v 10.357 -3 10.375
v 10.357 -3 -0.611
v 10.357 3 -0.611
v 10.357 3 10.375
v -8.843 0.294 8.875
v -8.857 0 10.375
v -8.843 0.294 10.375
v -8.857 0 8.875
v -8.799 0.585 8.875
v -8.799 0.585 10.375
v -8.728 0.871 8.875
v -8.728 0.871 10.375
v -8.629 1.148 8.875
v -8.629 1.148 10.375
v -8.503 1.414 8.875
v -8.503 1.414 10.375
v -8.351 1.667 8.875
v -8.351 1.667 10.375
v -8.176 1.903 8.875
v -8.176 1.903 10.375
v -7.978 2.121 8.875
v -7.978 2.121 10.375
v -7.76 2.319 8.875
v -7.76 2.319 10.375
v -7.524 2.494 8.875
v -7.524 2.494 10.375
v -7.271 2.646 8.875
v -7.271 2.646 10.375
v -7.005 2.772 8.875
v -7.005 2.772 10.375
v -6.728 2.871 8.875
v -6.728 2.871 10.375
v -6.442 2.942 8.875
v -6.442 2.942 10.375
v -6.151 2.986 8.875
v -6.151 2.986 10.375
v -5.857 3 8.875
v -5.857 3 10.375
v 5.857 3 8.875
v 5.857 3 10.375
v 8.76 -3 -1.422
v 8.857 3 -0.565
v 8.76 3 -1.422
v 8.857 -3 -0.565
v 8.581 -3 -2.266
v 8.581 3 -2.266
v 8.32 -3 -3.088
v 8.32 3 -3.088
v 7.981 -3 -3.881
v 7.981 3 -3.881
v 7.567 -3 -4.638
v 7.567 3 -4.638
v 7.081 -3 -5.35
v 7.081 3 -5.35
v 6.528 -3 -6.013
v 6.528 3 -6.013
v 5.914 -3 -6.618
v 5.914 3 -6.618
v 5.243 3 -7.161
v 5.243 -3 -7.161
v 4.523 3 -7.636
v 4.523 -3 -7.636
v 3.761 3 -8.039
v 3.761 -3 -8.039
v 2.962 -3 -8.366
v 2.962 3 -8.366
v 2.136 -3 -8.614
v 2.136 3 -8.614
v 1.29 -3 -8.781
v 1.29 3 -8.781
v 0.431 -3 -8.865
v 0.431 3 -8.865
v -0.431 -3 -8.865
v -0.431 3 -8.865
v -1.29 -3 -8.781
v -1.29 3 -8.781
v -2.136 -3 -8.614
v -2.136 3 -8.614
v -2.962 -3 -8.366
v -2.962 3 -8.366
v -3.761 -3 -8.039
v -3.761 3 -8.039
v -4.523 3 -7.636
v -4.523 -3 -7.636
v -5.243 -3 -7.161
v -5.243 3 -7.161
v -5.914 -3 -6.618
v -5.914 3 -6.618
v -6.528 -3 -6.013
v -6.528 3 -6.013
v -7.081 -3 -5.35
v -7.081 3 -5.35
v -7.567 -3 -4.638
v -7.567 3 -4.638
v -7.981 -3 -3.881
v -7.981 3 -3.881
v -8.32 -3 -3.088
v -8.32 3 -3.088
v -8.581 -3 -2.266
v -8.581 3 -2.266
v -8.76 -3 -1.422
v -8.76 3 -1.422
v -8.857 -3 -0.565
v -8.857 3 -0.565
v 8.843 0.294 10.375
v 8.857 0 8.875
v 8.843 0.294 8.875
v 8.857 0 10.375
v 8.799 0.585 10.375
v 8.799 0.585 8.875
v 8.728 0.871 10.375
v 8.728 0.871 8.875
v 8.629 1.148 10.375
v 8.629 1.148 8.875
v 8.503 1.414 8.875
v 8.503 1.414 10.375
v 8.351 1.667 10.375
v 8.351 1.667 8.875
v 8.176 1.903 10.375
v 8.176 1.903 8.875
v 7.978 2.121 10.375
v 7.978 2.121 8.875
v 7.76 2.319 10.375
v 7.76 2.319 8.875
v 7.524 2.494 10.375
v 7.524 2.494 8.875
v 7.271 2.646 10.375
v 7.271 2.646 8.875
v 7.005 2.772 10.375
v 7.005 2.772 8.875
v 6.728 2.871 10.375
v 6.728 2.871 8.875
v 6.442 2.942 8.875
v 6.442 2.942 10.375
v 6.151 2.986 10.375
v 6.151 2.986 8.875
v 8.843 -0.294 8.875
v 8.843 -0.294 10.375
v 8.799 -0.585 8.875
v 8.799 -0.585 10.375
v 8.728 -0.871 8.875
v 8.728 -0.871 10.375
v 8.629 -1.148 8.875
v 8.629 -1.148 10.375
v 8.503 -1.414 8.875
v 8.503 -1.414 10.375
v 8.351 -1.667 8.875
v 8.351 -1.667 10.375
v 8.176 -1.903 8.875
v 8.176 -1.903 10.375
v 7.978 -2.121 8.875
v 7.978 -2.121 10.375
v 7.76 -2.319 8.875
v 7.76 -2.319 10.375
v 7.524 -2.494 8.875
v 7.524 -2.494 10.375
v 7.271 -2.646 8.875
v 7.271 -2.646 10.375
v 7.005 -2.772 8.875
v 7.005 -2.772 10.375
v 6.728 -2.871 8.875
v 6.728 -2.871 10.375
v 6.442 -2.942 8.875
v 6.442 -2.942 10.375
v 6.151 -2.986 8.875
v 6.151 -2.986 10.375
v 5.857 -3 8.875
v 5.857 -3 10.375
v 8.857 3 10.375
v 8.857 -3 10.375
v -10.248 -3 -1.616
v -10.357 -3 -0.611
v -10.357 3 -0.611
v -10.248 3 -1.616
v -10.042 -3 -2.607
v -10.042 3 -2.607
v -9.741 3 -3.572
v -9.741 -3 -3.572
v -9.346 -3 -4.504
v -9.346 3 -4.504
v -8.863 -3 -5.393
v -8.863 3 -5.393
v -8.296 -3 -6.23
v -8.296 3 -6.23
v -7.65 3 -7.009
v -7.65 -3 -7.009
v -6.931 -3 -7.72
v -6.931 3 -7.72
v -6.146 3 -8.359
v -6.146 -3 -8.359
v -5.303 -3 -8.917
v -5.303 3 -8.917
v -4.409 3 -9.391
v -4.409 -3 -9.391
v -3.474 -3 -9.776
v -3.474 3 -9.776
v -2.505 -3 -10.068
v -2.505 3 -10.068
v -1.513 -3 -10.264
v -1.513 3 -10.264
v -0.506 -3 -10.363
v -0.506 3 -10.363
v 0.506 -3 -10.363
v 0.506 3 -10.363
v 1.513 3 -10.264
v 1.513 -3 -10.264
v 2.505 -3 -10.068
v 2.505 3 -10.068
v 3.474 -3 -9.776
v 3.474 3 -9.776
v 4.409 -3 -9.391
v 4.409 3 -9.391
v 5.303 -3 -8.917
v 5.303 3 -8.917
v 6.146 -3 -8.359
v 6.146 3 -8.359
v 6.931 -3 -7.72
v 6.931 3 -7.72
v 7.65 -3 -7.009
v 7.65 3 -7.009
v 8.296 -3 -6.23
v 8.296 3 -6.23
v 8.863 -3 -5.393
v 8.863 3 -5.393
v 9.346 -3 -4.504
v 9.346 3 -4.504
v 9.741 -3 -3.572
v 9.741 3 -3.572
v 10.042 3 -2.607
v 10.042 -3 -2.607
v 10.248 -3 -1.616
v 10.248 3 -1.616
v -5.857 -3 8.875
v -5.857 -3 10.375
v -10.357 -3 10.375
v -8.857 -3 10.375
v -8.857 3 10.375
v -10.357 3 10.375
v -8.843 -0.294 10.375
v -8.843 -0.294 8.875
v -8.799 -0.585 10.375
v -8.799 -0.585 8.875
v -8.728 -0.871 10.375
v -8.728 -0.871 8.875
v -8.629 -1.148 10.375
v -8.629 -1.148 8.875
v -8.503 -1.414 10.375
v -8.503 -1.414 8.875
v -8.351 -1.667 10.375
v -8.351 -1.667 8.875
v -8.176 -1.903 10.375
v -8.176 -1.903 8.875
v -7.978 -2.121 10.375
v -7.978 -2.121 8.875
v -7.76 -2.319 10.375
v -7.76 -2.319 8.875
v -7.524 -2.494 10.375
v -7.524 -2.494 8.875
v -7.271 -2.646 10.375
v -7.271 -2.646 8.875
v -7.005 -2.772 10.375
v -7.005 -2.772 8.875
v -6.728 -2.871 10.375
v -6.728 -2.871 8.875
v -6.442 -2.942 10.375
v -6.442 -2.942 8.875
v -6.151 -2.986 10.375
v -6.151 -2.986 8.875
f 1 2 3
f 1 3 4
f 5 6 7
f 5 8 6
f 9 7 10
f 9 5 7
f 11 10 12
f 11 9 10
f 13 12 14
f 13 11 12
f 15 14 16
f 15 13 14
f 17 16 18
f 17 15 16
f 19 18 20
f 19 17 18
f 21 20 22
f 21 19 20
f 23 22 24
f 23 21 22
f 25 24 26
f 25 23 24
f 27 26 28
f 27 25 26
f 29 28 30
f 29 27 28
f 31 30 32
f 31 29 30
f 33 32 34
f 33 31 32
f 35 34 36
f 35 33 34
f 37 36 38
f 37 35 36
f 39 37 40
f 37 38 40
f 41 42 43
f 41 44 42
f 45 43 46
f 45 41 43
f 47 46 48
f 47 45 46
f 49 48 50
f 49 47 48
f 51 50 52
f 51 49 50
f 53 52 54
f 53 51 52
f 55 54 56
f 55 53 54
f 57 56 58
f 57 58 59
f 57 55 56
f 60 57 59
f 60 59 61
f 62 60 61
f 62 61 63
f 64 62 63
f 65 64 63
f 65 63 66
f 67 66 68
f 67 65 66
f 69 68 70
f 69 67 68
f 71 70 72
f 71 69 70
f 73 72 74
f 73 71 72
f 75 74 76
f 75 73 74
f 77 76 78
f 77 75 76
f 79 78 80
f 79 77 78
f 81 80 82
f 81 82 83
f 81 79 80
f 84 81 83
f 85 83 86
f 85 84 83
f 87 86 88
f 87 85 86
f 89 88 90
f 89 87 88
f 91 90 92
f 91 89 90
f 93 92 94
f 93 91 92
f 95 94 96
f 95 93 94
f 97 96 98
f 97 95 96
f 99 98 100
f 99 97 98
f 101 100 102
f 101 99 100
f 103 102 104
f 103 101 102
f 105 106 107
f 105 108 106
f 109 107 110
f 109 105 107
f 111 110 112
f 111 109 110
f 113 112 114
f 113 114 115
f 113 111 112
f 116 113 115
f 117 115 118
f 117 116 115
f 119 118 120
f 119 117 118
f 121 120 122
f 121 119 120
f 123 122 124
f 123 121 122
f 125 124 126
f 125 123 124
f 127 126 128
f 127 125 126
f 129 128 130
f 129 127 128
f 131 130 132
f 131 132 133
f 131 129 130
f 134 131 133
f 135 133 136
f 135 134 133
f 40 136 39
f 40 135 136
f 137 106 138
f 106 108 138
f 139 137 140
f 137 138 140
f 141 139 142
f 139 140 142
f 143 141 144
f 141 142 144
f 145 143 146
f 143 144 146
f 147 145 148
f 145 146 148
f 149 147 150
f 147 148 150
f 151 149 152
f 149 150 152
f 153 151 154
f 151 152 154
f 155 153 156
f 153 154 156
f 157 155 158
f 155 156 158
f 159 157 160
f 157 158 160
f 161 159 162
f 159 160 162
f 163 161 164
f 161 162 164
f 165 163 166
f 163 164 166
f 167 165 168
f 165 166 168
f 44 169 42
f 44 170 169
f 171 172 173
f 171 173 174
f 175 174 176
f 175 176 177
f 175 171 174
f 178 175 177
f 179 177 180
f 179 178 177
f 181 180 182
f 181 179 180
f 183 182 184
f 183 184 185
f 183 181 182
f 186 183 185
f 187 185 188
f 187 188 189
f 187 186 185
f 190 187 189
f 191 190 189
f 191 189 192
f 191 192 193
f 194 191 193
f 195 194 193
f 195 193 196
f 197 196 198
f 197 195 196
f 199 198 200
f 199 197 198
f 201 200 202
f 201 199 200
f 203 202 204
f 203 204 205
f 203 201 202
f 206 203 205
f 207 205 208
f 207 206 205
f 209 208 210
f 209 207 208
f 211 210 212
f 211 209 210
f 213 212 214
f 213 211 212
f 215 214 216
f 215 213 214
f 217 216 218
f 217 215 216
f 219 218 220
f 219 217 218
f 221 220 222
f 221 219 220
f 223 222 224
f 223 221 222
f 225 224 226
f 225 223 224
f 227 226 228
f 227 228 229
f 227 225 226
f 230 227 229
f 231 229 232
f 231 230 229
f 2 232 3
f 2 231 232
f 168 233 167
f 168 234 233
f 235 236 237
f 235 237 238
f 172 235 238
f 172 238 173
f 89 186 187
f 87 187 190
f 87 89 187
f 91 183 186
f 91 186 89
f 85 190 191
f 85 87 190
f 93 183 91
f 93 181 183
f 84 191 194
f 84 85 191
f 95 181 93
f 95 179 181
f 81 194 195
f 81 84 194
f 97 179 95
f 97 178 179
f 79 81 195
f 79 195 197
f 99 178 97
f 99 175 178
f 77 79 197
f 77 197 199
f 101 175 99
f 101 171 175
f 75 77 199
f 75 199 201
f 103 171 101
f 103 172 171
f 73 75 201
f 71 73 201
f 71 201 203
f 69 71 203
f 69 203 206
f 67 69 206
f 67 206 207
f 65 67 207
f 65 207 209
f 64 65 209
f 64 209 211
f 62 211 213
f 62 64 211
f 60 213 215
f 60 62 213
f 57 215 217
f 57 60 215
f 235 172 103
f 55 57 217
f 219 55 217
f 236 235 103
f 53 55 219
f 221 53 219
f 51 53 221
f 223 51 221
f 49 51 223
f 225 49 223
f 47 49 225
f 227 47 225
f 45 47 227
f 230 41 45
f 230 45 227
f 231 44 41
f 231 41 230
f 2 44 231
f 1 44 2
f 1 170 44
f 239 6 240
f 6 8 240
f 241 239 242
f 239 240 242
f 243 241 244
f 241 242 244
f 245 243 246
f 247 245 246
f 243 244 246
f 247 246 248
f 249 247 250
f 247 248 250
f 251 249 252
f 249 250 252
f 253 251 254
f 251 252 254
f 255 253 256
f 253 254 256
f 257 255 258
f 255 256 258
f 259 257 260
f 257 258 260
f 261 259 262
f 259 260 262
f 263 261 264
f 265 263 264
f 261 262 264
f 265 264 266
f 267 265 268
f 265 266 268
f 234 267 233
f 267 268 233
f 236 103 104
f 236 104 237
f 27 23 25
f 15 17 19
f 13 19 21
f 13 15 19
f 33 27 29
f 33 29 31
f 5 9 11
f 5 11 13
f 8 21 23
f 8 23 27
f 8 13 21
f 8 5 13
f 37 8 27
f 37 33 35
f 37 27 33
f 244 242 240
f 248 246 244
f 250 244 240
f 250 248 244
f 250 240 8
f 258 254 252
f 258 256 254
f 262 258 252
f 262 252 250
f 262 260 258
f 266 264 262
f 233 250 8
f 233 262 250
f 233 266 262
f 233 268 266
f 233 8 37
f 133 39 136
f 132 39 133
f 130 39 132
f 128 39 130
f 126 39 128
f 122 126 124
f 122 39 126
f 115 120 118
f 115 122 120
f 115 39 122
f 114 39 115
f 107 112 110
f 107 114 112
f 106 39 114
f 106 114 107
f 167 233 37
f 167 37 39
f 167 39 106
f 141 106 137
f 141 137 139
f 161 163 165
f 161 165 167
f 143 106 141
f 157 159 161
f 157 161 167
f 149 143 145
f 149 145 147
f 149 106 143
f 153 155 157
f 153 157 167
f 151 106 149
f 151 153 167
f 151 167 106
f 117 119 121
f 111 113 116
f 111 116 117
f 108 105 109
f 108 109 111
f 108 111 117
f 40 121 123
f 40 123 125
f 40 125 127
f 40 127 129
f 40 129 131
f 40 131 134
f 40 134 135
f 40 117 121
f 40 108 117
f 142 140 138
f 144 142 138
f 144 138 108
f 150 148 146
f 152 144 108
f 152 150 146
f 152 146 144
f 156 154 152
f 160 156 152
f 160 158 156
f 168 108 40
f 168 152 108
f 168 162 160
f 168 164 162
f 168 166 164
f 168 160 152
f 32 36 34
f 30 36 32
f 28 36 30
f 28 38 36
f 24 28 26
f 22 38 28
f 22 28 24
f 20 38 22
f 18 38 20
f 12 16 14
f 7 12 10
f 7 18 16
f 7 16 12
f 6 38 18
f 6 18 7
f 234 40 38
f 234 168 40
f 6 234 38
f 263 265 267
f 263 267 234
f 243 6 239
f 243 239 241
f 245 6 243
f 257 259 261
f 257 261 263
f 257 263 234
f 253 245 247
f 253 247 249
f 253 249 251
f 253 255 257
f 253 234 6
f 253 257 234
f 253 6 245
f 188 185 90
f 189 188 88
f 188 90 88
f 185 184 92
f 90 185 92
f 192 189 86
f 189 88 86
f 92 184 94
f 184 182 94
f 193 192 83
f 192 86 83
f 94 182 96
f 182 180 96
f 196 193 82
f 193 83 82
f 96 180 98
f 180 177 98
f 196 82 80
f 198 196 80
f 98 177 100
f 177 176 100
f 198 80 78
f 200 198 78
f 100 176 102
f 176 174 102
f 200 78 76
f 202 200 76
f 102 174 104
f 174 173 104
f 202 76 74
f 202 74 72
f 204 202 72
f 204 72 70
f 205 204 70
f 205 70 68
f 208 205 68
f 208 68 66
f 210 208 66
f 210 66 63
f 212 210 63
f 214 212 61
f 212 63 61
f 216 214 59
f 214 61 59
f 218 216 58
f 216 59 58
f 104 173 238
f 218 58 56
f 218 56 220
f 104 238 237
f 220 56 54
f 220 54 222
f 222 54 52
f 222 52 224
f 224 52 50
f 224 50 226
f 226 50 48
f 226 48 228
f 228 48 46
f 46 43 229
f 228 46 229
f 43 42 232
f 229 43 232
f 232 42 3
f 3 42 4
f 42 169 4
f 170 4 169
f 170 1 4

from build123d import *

# Parameters (mm, degrees)
F1_DEPTH      = 3
F1_DEPTH_BACK = 3
F2_DEPTH      = 3
F2_DEPTH_BACK = 3
F3_R          = 2.99999


# Not quite as in the source:
# - a fillet or chamfer is up to 0.001 mm smaller than in the source, because OpenCascade refuses the exact size


with BuildPart() as f1:
    # F0 (on Front) → F1 (new body, two sides)
    with BuildSketch(Plane.XZ) as f1_sk:
        with BuildLine():
            ThreePointArc((8.8570139732, -0.5647375303), (0, -8.875), (-8.8570139732, -0.5647375303))
            Line((-8.8570139732, -0.5647375303), (-8.8570139732, 8.875))
            Line((-8.8570139732, 8.875), (-8.8570139732, 10.375))
            Line((-8.8570139732, 10.375), (-10.3570139732, 10.375))
            Line((-10.3570139732, 10.375), (-10.3570139732, 8.875))
            Line((-10.3570139732, 8.875), (-10.3570139732, -0.6106443797))
            ThreePointArc((-10.3570139732, -0.6106443797), (0, -10.375), (10.3570139732, -0.6106443797))
            Line((10.3570139732, -0.6106443797), (10.3570139732, 8.875))
            Line((10.3570139732, 8.875), (10.3570139732, 10.375))
            Line((10.3570139732, 10.375), (8.8570139732, 10.375))
            Line((8.8570139732, 10.375), (8.8570139732, 8.875))
            Line((8.8570139732, 8.875), (8.8570139732, -0.5647375303))
        make_face()
    extrude(amount=F1_DEPTH)
    extrude(f1_sk.sketch, amount=-F1_DEPTH_BACK)


with BuildPart() as f2:
    # F0 (on Front) → F2 (new body, two sides)
    with BuildSketch(Plane.XZ) as f2_sk:
        Polygon((-8.8570139732, 10.375), (-8.8570139732, 8.875), (-0.6155143709, 8.875), (0.6154856291, 8.875), (8.8570139732, 8.875), (8.8570139732, 10.375), align=None)
    extrude(amount=F2_DEPTH)
    extrude(f2_sk.sketch, amount=-F2_DEPTH_BACK)

    # F3 (radius 3 in the source; OpenCascade refuses exactly that, so slightly less here)
    f3_edges = [f2.edges().sort_by_distance(p)[0] for p in [
        (-8.857014, -3, 9.625),
        (-8.857014, 3, 9.625),
        (8.857014, -3, 9.625),
        (8.857014, 3, 9.625),
    ]]
    fillet(f3_edges, radius=F3_R)


solid = Compound([f1.part, f2.part])
